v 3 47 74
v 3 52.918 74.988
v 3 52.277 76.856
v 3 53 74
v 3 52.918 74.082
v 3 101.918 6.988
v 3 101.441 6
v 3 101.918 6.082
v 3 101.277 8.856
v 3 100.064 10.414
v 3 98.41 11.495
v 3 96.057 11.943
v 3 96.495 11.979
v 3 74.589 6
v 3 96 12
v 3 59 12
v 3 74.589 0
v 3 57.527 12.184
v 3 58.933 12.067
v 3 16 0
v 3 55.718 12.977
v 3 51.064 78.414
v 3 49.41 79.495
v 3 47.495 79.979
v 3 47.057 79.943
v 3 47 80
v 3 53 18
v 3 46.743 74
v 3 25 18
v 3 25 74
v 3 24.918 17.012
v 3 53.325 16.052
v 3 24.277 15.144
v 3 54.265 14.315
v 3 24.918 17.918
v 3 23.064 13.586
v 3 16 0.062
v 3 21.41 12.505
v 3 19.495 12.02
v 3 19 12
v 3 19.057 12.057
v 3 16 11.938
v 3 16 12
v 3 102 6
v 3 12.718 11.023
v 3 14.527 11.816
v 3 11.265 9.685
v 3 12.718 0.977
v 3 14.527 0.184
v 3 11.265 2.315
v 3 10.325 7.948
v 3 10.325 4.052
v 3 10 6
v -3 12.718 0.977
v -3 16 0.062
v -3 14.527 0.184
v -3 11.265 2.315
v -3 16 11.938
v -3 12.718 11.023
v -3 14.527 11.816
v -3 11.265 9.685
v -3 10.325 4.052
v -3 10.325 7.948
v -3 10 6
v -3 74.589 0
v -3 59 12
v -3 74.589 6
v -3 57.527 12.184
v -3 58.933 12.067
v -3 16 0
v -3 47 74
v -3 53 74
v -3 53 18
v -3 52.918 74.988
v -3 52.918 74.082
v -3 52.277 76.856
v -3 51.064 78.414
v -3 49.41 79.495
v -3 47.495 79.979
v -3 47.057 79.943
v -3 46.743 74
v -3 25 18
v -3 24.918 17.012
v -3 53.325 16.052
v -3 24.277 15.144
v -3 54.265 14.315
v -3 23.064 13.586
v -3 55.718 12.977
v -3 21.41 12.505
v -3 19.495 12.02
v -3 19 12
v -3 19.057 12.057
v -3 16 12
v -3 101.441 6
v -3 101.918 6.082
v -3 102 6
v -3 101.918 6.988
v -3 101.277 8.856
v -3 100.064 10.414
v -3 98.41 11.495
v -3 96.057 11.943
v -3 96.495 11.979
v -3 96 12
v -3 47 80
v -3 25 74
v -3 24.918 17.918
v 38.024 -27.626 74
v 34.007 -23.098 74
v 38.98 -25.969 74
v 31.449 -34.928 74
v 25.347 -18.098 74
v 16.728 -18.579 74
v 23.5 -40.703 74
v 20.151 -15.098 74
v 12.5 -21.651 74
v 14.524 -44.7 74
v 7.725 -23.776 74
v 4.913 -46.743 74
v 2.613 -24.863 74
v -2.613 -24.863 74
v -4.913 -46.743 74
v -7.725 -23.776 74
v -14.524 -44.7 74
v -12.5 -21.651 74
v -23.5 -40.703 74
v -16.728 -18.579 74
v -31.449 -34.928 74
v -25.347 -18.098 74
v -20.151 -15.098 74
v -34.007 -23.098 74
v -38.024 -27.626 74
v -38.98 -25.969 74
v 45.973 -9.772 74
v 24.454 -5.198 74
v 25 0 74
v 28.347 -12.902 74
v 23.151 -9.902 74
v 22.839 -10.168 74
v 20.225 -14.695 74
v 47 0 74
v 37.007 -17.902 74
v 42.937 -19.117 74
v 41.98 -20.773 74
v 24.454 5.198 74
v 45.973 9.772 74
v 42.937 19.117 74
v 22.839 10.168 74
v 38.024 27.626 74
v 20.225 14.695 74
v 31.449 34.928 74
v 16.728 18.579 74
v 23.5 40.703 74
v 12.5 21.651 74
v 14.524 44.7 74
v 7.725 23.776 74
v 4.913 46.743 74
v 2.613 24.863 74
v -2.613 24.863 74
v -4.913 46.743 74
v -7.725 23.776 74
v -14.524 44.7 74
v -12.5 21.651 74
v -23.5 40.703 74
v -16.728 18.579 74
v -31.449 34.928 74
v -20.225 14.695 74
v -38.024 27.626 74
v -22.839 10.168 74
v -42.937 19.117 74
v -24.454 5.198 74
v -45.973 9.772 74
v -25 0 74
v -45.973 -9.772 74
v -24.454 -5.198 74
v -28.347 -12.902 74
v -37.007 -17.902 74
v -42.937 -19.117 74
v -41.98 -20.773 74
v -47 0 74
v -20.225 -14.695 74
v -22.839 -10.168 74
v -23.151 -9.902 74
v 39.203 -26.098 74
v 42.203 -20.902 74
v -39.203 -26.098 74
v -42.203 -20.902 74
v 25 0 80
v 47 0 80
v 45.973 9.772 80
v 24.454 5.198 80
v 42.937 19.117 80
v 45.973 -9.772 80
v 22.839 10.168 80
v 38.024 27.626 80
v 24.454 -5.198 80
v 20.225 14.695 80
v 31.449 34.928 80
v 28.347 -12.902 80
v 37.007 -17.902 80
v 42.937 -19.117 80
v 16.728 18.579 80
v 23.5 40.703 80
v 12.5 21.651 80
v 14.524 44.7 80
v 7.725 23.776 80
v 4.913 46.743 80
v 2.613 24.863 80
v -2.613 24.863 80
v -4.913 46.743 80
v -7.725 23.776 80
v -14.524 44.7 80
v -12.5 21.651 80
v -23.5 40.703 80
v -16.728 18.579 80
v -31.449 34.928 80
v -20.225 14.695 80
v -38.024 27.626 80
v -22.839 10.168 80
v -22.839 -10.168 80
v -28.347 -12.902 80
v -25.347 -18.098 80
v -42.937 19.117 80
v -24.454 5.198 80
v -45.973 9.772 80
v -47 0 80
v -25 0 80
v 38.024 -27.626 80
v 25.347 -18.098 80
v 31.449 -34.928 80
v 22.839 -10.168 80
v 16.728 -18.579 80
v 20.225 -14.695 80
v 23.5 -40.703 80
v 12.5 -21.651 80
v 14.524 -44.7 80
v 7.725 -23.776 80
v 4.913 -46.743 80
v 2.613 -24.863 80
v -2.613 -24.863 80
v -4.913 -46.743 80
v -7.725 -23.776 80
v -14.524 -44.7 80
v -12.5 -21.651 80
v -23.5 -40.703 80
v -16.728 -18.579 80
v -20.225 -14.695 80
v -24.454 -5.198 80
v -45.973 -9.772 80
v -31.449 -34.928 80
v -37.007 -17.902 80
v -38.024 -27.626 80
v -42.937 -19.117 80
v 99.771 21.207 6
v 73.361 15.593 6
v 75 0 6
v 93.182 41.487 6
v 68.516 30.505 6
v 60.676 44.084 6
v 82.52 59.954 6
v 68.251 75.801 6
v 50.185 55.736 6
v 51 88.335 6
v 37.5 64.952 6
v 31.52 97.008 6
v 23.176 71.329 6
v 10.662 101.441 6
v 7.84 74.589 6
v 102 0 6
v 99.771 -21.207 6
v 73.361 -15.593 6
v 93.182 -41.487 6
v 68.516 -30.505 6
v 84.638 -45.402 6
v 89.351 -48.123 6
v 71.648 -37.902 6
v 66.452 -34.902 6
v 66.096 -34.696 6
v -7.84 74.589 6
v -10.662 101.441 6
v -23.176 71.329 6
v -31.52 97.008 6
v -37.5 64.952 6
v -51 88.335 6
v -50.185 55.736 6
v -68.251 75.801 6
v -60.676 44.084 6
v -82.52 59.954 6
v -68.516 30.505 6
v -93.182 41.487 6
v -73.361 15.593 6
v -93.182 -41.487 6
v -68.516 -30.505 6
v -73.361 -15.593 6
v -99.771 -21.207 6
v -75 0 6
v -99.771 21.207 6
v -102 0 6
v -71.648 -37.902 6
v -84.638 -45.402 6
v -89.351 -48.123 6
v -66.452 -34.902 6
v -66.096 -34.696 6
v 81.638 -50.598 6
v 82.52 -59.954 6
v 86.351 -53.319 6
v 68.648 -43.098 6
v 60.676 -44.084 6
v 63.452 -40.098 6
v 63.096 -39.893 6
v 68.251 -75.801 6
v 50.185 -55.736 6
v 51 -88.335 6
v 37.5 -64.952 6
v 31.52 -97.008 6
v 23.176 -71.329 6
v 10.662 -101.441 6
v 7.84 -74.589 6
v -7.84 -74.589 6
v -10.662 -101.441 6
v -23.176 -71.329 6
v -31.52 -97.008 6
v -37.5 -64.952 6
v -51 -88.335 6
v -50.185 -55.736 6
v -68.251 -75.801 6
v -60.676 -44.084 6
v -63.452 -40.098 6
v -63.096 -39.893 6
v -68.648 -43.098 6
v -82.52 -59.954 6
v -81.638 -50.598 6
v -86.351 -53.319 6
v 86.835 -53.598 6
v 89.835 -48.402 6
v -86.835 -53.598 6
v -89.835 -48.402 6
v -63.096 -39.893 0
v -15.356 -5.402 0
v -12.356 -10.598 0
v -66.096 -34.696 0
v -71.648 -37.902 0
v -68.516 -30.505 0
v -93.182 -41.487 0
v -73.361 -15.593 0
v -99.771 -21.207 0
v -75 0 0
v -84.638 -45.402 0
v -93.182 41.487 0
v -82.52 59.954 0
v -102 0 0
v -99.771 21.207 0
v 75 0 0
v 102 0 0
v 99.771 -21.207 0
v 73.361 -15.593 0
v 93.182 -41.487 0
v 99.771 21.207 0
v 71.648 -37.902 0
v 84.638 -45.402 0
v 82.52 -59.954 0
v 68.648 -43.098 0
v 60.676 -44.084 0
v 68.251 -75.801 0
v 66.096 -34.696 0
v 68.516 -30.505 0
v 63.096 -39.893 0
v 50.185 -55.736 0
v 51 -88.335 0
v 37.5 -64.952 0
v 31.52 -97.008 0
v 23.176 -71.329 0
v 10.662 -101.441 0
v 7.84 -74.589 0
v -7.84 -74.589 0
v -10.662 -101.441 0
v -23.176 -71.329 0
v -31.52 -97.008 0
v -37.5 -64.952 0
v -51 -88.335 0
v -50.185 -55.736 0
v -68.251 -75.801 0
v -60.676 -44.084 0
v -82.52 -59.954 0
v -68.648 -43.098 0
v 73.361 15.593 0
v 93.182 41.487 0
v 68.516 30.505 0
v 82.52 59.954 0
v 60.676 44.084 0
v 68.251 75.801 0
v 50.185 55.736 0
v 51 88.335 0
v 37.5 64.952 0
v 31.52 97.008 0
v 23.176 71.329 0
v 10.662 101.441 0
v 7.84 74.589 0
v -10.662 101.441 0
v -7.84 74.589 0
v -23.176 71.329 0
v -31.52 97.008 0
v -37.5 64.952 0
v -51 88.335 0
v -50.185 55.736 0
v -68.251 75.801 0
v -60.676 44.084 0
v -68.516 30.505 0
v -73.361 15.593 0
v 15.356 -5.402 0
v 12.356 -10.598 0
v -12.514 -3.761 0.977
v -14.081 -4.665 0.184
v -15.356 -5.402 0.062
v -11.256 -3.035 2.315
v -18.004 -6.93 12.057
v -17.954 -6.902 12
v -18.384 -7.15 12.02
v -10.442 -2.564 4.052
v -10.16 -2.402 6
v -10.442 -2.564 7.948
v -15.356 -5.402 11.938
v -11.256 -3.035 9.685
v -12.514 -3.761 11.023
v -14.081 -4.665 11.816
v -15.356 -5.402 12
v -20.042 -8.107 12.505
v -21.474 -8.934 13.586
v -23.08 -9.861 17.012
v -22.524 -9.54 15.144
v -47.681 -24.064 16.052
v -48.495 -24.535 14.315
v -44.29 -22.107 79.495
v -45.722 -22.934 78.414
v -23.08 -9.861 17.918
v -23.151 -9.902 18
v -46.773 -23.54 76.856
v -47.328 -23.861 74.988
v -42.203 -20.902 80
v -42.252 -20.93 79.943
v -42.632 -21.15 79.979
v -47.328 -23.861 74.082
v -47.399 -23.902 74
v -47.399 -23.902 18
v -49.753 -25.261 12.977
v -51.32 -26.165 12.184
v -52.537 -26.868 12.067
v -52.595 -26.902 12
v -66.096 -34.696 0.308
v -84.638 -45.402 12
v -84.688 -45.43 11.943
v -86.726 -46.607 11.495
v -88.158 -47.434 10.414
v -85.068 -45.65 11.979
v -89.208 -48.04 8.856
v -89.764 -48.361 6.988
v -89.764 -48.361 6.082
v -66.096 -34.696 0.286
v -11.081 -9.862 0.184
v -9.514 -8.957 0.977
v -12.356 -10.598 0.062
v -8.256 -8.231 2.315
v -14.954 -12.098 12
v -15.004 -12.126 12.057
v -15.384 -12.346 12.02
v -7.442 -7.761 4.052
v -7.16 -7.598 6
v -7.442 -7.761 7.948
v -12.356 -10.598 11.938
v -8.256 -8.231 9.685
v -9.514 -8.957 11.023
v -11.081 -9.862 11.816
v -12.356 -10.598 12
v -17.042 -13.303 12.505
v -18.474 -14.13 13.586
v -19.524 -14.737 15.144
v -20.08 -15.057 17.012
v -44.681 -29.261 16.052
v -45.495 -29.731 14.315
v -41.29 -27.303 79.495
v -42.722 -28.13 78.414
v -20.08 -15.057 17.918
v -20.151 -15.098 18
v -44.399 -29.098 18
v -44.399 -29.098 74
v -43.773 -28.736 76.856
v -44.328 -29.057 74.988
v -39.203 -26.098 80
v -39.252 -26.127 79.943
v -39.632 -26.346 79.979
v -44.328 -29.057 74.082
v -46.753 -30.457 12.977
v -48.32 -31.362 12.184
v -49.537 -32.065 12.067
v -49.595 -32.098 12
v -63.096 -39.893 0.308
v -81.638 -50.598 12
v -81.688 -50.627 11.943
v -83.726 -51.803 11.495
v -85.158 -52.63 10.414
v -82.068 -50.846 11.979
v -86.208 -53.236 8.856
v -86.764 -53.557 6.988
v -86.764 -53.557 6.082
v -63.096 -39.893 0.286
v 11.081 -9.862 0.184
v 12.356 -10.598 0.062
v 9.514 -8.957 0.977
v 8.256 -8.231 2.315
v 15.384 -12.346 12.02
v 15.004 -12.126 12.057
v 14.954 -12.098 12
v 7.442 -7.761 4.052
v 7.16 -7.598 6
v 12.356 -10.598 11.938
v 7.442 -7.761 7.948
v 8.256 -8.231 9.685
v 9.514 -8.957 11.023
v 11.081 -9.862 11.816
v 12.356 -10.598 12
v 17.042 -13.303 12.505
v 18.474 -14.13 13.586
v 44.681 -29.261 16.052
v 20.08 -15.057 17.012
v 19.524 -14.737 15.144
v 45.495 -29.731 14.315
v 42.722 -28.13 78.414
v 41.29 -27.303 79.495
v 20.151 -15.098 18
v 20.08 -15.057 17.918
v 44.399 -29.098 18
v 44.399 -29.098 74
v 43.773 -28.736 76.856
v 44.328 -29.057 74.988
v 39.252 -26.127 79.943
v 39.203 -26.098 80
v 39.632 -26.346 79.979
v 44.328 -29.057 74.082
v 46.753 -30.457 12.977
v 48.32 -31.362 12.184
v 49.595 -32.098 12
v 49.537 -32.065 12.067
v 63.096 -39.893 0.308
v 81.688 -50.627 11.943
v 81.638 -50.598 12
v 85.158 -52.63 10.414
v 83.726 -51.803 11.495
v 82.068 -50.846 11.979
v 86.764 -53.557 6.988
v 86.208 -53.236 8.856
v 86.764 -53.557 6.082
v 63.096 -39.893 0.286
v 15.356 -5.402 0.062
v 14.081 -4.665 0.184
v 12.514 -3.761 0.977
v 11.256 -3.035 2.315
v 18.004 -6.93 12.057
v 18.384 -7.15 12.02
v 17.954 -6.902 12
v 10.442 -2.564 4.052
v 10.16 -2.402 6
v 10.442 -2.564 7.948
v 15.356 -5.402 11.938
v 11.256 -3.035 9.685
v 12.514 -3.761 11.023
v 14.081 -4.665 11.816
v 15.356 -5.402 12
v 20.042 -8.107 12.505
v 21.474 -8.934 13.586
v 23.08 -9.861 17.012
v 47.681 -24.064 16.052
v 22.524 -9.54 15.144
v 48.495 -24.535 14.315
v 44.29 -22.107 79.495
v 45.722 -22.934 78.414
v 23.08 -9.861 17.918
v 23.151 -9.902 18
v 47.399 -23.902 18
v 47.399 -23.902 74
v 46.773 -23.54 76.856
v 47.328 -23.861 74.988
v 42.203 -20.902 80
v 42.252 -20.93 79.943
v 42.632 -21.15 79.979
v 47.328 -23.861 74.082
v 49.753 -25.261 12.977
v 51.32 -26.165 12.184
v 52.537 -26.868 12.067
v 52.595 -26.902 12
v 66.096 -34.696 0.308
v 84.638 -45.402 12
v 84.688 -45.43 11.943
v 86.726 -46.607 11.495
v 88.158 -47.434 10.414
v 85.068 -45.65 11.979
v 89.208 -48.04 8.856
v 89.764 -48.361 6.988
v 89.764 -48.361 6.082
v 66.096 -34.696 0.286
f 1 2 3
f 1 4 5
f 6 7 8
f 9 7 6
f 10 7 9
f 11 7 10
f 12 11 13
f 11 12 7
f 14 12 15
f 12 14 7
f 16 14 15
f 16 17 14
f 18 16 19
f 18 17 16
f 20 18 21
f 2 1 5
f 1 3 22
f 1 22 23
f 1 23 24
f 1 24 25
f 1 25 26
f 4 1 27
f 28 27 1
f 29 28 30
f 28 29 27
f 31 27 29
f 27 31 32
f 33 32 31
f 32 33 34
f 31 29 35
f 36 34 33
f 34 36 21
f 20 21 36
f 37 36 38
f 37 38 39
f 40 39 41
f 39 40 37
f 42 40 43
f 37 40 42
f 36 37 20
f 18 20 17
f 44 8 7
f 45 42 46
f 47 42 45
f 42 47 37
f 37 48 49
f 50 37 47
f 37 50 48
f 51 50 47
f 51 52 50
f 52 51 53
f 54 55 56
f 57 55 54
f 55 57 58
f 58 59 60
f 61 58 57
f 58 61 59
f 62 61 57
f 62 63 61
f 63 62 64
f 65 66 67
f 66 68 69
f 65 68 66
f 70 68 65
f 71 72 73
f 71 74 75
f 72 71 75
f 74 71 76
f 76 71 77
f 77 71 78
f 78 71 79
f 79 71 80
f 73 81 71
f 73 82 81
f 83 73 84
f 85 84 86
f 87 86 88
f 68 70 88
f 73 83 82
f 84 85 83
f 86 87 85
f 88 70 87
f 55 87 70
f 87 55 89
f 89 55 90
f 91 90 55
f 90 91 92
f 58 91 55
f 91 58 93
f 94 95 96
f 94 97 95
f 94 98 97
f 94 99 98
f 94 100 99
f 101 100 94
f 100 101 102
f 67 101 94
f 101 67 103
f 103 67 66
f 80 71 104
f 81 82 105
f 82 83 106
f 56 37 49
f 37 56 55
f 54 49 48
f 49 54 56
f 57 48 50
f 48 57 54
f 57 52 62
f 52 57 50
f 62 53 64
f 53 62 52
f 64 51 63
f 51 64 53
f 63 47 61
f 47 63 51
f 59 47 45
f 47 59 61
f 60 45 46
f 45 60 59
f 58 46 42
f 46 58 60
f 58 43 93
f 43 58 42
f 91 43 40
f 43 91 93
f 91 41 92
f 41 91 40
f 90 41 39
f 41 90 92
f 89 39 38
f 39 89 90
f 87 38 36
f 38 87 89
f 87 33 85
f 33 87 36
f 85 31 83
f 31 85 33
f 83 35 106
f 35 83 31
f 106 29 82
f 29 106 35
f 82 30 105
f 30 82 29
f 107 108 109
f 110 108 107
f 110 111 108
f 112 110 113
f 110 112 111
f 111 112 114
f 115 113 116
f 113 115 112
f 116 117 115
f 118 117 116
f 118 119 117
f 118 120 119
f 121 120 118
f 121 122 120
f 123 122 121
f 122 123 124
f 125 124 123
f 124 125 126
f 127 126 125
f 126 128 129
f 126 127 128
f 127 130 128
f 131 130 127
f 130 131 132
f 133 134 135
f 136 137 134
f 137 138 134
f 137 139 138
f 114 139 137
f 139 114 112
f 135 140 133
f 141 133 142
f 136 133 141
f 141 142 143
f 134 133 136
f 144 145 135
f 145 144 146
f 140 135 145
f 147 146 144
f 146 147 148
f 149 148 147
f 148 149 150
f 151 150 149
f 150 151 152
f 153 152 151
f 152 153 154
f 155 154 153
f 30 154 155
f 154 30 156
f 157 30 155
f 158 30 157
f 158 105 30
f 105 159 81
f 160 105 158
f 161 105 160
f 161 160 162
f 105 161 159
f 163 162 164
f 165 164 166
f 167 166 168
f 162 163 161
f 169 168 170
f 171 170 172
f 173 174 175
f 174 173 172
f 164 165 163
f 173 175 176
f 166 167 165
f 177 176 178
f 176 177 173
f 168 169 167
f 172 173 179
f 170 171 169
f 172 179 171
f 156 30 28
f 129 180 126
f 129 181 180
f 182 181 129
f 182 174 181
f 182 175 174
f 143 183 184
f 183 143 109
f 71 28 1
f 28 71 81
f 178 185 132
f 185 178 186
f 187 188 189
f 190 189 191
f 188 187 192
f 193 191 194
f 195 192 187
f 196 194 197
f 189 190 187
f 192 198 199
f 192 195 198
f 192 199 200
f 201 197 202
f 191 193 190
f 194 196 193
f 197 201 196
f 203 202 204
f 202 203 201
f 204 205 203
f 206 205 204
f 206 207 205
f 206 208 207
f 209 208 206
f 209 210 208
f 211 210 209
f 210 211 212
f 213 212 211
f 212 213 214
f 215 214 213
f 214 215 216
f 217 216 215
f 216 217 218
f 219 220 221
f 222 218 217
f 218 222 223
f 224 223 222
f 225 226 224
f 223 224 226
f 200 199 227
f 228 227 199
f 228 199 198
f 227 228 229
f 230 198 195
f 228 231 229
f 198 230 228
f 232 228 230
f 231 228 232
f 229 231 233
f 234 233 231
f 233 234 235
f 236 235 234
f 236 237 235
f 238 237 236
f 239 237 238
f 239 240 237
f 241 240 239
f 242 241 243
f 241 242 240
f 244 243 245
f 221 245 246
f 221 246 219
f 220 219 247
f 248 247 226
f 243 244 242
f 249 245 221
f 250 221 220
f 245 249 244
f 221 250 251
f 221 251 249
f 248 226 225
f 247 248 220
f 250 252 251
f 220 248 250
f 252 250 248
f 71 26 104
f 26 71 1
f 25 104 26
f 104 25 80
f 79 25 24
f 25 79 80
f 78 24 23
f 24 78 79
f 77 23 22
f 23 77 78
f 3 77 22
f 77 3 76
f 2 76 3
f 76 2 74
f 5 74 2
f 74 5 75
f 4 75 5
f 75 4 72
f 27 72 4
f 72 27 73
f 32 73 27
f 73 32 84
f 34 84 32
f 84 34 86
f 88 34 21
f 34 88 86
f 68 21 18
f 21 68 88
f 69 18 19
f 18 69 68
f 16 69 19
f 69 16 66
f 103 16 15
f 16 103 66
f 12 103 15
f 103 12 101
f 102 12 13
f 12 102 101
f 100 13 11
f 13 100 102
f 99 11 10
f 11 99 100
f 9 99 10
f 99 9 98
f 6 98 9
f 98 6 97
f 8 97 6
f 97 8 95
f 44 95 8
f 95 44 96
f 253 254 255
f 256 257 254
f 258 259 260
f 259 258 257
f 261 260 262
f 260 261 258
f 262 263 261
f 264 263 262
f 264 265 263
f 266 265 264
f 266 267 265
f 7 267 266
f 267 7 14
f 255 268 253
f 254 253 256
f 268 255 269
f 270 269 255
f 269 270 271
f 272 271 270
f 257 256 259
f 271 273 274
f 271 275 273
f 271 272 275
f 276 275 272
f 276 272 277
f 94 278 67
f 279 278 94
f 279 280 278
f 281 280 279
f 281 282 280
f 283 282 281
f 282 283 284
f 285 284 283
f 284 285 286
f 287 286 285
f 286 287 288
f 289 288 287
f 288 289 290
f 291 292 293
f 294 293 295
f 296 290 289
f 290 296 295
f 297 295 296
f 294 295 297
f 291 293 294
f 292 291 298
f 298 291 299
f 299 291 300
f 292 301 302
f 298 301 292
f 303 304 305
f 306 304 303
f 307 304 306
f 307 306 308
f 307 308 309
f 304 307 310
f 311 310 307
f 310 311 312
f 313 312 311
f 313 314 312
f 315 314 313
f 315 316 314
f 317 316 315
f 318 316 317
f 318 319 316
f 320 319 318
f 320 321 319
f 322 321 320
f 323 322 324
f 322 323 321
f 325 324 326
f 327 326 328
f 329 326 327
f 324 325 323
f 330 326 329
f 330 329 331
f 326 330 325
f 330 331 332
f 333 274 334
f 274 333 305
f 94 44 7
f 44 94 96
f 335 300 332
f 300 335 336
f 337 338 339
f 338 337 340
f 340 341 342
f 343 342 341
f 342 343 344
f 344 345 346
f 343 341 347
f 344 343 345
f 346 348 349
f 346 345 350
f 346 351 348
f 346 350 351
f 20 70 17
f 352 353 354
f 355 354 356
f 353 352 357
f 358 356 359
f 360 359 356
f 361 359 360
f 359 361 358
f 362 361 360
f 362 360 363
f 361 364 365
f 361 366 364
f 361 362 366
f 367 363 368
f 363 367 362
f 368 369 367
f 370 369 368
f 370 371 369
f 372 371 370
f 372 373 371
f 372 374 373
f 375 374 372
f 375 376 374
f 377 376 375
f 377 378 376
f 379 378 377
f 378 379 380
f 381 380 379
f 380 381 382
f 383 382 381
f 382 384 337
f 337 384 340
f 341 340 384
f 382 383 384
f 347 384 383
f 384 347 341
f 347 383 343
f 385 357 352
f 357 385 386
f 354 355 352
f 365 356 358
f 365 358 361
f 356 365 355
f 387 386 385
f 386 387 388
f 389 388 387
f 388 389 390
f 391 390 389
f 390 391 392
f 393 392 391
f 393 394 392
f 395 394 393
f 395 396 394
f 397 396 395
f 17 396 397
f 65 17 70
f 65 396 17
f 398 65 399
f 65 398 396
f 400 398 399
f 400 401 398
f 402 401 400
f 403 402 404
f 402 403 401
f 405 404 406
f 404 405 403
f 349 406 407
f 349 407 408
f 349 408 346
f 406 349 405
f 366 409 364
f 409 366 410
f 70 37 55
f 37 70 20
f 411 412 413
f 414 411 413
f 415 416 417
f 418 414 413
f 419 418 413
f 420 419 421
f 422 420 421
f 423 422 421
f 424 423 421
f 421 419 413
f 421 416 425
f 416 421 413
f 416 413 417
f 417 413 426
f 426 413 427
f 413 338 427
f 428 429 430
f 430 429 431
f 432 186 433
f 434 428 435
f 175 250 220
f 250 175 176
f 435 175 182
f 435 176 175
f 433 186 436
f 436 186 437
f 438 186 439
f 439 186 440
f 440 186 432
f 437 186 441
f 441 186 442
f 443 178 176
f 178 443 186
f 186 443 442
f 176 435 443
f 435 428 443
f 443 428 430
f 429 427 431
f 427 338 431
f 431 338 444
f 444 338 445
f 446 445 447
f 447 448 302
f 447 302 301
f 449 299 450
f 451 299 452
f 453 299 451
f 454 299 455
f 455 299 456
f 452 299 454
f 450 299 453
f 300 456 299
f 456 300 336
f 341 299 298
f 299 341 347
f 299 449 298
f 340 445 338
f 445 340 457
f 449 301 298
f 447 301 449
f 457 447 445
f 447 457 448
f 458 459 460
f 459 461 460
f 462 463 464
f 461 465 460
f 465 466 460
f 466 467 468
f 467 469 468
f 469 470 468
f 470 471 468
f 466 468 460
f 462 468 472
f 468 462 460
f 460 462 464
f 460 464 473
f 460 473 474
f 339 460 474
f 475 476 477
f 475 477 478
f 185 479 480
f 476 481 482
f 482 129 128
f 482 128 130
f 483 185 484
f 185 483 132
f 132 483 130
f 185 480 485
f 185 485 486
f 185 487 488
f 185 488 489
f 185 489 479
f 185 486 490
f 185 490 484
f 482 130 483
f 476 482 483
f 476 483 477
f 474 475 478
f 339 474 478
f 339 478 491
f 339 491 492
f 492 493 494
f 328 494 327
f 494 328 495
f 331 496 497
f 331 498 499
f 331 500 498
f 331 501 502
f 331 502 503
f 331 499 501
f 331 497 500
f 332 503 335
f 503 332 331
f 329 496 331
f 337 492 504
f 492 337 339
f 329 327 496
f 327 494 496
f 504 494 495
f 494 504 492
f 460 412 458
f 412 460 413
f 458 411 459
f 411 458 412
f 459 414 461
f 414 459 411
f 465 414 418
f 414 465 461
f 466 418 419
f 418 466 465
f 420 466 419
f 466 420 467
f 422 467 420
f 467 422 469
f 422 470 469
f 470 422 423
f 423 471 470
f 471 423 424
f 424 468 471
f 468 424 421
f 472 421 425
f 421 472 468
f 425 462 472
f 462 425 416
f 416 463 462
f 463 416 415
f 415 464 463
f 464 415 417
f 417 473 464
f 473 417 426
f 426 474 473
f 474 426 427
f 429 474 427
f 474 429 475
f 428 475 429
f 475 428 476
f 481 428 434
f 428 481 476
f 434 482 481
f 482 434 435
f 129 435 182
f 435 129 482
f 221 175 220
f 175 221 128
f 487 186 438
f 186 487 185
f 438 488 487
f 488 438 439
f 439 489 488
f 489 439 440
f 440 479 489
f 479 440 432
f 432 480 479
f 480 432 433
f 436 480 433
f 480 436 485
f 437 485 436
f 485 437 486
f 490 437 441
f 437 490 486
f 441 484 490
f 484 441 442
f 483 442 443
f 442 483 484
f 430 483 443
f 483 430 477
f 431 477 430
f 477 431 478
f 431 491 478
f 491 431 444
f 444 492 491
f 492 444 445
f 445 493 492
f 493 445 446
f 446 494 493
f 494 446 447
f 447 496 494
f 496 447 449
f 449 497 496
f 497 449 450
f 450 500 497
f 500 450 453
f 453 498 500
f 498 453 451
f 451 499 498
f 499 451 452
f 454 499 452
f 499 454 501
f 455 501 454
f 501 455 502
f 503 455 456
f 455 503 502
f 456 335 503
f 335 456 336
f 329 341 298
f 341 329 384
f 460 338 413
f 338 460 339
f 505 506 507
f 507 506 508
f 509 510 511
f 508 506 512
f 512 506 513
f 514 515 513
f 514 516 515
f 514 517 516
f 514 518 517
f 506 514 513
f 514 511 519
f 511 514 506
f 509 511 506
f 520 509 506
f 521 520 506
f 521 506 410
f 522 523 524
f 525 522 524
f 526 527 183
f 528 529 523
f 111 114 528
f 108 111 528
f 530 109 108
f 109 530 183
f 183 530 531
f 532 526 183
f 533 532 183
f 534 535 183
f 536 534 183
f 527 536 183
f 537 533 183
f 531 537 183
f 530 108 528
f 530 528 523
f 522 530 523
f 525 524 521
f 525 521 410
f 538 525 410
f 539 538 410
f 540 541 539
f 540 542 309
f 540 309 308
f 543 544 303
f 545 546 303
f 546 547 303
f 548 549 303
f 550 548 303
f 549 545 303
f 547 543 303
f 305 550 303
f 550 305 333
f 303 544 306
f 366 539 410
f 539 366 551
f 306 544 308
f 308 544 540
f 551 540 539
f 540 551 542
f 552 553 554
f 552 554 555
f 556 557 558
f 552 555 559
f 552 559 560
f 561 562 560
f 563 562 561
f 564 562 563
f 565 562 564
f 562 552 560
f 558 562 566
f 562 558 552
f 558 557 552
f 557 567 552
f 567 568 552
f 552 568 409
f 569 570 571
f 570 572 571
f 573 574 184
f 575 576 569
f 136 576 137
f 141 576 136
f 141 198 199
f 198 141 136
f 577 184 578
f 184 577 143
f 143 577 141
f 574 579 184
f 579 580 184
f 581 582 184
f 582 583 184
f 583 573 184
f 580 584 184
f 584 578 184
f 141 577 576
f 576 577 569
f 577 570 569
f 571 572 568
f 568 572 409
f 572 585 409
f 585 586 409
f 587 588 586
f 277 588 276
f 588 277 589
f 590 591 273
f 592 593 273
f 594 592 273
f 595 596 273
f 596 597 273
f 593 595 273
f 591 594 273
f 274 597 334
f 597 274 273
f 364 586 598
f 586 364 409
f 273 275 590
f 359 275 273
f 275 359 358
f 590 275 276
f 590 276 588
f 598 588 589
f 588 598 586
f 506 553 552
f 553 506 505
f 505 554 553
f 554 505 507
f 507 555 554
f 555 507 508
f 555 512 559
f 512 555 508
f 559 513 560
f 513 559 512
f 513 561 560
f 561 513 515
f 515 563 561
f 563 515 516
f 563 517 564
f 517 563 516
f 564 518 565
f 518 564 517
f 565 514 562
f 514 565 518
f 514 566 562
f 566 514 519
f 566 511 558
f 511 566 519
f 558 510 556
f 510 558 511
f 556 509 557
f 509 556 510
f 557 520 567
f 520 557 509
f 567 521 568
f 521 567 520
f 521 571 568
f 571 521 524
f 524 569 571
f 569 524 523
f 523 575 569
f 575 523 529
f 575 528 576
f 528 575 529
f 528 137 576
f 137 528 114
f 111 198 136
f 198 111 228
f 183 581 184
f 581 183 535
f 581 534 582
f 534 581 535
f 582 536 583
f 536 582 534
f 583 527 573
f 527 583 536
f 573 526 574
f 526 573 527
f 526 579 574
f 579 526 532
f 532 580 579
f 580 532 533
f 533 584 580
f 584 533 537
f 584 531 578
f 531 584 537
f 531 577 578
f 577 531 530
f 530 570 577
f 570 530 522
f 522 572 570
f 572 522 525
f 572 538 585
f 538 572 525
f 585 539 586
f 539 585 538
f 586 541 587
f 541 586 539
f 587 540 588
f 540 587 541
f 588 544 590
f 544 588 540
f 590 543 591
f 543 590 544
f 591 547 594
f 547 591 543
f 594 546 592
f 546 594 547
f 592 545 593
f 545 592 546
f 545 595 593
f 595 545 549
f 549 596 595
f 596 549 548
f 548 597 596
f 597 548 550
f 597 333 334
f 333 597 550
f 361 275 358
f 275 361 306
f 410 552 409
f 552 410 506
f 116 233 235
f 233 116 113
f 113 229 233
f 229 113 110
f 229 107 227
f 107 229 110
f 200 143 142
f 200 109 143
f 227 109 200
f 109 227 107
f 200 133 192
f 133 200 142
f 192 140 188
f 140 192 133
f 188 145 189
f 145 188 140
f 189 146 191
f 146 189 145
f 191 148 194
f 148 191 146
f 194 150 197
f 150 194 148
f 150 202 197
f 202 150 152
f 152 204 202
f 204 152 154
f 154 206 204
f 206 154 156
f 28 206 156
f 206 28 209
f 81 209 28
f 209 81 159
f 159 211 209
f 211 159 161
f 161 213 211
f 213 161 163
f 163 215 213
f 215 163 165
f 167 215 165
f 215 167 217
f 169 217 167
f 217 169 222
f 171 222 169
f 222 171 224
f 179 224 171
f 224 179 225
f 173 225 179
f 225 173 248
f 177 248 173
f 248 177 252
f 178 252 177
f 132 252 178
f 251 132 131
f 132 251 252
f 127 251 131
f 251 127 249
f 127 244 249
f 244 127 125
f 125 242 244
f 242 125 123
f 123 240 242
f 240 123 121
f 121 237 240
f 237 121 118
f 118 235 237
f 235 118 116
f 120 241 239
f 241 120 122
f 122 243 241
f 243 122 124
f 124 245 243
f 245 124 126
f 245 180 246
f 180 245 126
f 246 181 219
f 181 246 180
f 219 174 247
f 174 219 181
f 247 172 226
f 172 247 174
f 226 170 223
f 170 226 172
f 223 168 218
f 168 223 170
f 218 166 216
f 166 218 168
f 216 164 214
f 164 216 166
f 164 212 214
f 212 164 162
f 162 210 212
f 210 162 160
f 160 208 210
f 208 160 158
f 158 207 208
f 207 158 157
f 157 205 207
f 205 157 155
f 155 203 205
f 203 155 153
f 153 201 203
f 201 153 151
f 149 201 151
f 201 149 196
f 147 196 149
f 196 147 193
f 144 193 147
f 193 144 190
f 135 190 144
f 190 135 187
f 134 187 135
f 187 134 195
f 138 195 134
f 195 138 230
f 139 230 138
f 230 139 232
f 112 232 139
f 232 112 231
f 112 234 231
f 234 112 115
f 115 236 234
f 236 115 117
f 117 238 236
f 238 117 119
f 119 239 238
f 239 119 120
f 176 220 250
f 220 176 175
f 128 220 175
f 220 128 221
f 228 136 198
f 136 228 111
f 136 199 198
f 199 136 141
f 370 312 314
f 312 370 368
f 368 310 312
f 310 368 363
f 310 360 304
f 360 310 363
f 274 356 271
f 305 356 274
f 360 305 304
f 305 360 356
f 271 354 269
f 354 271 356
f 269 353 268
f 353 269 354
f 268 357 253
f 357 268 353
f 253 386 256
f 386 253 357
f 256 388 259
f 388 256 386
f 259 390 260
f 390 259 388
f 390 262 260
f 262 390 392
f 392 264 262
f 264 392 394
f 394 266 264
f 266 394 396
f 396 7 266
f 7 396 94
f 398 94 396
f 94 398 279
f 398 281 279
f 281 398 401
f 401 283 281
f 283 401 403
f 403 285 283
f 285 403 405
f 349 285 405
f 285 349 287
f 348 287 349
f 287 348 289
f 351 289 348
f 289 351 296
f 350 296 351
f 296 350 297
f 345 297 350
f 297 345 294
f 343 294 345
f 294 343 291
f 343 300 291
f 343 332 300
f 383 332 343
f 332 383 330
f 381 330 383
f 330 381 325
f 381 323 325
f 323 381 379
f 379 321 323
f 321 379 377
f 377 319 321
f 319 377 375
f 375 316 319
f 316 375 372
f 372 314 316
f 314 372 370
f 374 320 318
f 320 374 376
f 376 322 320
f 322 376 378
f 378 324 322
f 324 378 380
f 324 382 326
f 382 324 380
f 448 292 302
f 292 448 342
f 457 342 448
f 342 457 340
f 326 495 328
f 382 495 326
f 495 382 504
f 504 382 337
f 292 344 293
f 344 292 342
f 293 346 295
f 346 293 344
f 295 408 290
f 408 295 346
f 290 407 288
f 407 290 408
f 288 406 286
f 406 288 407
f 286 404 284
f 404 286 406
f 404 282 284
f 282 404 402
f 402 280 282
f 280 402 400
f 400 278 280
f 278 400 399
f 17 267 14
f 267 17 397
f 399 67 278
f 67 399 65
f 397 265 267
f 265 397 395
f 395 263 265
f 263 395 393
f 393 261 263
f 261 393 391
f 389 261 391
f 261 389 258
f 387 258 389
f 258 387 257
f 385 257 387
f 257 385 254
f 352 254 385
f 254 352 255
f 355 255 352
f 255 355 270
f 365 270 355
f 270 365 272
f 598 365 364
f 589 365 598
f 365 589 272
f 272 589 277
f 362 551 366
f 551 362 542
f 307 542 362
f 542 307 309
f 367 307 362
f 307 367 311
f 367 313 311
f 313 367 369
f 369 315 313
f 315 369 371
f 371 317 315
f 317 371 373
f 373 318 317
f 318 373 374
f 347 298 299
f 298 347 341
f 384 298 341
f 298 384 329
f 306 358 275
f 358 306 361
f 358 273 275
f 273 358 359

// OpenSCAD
// To render the DXF file from the command line:
// openscad -o tripod.dxf -D'mode="parts"' example017.scad

// mode = "parts";
// mode = "exploded";
mode = "assembled";

thickness = 6;
locklen1 = 15;
locklen2 = 10;
boltlen = 15;
midhole = 10;
inner1_to_inner2 = 50;
total_height = 80;

module shape_tripod()
{
	x1 = 0;
	x2 = x1 + thickness;
	x3 = x2 + locklen1;
	x4 = x3 + thickness;
	x5 = x4 + inner1_to_inner2;
	x6 = x5 - thickness;
	x7 = x6 - locklen2;
	x8 = x7 - thickness;
	x9 = x8 - thickness;
	x10 = x9 - thickness;
	
	y1 = 0;
	y2 = y1 + thickness;
	y3 = y2 + thickness;
	y4 = y3 + thickness;
	y5 = y3 + total_height - 3*thickness;
	y6 = y5 + thickness;
	
	union()
	{
		difference() {
			polygon([
				[ x1, y2 ], [ x2, y2 ],
				[ x2, y1 ], [ x3, y1 ], [ x3, y2 ],
				[ x4, y2 ], [ x4, y1 ], [ x5, y1 ],
				[ x5 + thickness, y3 ], [ x5, y4 ],
				[ x5, y5 ],
				[ x6, y5 ], [ x6, y6 ], [ x7, y6 ], [ x7, y5 ], [ x8, y5 ],
				[ x8, y6 ], [ x9, y5 ],
				[ x9, y4 ], [ x10, y3 ],
				[ x2, y3 ]
			]);
			translate([ x10, y4 ]) circle(thickness);
			translate([ x5 + thickness, y4 ]) circle(thickness);
		}
	
		translate([ x5, y1 ])
		square([ boltlen - thickness, thickness*2 ]);
	
		translate([ x5 + boltlen - thickness, y2 ]) circle(thickness);
	
		translate([ x2, y2 ]) intersection() {
			circle(thickness);
			translate([ -thickness*2, 0 ]) square(thickness*2);
		}
	
		translate([ x8, y5 ]) intersection() {
			circle(thickness);
			translate([ -thickness*2, 0 ]) square(thickness*2);
		}
	}
}

module shape_inner_disc()
{
	difference() {
		circle(midhole + boltlen + 2*thickness + locklen2);
		for (alpha = [ 0, 120, 240 ])
			rotate(alpha) translate([ 0, midhole + boltlen + thickness + locklen2/2 ]) square([ thickness, locklen2 ], true);
		circle(midhole + boltlen);
	}
}

module shape_outer_disc()
{
	difference() {
		circle(midhole + boltlen + inner1_to_inner2 + 2*thickness + locklen1);
		for (alpha = [ 0, 120, 240 ])
			rotate(alpha) translate([ 0, midhole + boltlen + inner1_to_inner2 + thickness + locklen1/2 ]) square([ thickness, locklen1 ], true);
		circle(midhole + boltlen + inner1_to_inner2);
	}
}

module parts()
{
	tripod_x_off = locklen1 - locklen2 + inner1_to_inner2;
	tripod_y_off = max(midhole + boltlen + inner1_to_inner2 + 4*thickness + locklen1, total_height);

	shape_inner_disc();
	shape_outer_disc();

	for (s = [ [1,1], [-1,1], [1,-1] ])
		scale(s) translate([ tripod_x_off, -tripod_y_off ]) shape_tripod();
}

module exploded()
{
	translate([ 0, 0, total_height + 2*thickness ]) linear_extrude(height = thickness, convexity = 4) shape_inner_disc();
	linear_extrude(height = thickness, convexity = 4) shape_outer_disc();

	color([ 0.7, 0.7, 1 ]) for (alpha = [ 0, 120, 240 ])
		rotate(alpha) translate([ 0, thickness*2 + locklen1 + inner1_to_inner2 + boltlen + midhole, 1.5*thickness ])
			rotate([ 90, 0, -90 ]) linear_extrude(height = thickness, convexity = 10, center = true) shape_tripod();
}

module bottle()
{
	r = boltlen + midhole;
	h = total_height - thickness*2;

	rotate_extrude(convexity = 2)
	{
		square([ r, h ]);

		translate([ 0, h ])
		intersection() {
			square([ r, r ]);
			scale([ 1, 0.7 ]) circle(r);
		}

		translate([ 0, h+r ])
		intersection() {
			translate([ 0, -r/2 ]) square([ r/2, r ]);
			circle(r/2);
		}
	}
}

module assembled()
{
	translate([ 0, 0, total_height - thickness ]) linear_extrude(height = thickness, convexity = 4) shape_inner_disc();
	linear_extrude(height = thickness, convexity = 4) shape_outer_disc();

	color([ 0.7, 0.7, 1 ]) for (alpha = [ 0, 120, 240 ])
		rotate(alpha) translate([ 0, thickness*2 + locklen1 + inner1_to_inner2 + boltlen + midhole, 0 ])
			rotate([ 90, 0, -90 ]) linear_extrude(height = thickness, convexity = 10, center = true) shape_tripod();

	% translate([ 0, 0, thickness*2]) bottle();
}

if (mode == "parts")
	parts();

if (mode == "exploded")
	exploded();

if (mode == "assembled")
	assembled();
